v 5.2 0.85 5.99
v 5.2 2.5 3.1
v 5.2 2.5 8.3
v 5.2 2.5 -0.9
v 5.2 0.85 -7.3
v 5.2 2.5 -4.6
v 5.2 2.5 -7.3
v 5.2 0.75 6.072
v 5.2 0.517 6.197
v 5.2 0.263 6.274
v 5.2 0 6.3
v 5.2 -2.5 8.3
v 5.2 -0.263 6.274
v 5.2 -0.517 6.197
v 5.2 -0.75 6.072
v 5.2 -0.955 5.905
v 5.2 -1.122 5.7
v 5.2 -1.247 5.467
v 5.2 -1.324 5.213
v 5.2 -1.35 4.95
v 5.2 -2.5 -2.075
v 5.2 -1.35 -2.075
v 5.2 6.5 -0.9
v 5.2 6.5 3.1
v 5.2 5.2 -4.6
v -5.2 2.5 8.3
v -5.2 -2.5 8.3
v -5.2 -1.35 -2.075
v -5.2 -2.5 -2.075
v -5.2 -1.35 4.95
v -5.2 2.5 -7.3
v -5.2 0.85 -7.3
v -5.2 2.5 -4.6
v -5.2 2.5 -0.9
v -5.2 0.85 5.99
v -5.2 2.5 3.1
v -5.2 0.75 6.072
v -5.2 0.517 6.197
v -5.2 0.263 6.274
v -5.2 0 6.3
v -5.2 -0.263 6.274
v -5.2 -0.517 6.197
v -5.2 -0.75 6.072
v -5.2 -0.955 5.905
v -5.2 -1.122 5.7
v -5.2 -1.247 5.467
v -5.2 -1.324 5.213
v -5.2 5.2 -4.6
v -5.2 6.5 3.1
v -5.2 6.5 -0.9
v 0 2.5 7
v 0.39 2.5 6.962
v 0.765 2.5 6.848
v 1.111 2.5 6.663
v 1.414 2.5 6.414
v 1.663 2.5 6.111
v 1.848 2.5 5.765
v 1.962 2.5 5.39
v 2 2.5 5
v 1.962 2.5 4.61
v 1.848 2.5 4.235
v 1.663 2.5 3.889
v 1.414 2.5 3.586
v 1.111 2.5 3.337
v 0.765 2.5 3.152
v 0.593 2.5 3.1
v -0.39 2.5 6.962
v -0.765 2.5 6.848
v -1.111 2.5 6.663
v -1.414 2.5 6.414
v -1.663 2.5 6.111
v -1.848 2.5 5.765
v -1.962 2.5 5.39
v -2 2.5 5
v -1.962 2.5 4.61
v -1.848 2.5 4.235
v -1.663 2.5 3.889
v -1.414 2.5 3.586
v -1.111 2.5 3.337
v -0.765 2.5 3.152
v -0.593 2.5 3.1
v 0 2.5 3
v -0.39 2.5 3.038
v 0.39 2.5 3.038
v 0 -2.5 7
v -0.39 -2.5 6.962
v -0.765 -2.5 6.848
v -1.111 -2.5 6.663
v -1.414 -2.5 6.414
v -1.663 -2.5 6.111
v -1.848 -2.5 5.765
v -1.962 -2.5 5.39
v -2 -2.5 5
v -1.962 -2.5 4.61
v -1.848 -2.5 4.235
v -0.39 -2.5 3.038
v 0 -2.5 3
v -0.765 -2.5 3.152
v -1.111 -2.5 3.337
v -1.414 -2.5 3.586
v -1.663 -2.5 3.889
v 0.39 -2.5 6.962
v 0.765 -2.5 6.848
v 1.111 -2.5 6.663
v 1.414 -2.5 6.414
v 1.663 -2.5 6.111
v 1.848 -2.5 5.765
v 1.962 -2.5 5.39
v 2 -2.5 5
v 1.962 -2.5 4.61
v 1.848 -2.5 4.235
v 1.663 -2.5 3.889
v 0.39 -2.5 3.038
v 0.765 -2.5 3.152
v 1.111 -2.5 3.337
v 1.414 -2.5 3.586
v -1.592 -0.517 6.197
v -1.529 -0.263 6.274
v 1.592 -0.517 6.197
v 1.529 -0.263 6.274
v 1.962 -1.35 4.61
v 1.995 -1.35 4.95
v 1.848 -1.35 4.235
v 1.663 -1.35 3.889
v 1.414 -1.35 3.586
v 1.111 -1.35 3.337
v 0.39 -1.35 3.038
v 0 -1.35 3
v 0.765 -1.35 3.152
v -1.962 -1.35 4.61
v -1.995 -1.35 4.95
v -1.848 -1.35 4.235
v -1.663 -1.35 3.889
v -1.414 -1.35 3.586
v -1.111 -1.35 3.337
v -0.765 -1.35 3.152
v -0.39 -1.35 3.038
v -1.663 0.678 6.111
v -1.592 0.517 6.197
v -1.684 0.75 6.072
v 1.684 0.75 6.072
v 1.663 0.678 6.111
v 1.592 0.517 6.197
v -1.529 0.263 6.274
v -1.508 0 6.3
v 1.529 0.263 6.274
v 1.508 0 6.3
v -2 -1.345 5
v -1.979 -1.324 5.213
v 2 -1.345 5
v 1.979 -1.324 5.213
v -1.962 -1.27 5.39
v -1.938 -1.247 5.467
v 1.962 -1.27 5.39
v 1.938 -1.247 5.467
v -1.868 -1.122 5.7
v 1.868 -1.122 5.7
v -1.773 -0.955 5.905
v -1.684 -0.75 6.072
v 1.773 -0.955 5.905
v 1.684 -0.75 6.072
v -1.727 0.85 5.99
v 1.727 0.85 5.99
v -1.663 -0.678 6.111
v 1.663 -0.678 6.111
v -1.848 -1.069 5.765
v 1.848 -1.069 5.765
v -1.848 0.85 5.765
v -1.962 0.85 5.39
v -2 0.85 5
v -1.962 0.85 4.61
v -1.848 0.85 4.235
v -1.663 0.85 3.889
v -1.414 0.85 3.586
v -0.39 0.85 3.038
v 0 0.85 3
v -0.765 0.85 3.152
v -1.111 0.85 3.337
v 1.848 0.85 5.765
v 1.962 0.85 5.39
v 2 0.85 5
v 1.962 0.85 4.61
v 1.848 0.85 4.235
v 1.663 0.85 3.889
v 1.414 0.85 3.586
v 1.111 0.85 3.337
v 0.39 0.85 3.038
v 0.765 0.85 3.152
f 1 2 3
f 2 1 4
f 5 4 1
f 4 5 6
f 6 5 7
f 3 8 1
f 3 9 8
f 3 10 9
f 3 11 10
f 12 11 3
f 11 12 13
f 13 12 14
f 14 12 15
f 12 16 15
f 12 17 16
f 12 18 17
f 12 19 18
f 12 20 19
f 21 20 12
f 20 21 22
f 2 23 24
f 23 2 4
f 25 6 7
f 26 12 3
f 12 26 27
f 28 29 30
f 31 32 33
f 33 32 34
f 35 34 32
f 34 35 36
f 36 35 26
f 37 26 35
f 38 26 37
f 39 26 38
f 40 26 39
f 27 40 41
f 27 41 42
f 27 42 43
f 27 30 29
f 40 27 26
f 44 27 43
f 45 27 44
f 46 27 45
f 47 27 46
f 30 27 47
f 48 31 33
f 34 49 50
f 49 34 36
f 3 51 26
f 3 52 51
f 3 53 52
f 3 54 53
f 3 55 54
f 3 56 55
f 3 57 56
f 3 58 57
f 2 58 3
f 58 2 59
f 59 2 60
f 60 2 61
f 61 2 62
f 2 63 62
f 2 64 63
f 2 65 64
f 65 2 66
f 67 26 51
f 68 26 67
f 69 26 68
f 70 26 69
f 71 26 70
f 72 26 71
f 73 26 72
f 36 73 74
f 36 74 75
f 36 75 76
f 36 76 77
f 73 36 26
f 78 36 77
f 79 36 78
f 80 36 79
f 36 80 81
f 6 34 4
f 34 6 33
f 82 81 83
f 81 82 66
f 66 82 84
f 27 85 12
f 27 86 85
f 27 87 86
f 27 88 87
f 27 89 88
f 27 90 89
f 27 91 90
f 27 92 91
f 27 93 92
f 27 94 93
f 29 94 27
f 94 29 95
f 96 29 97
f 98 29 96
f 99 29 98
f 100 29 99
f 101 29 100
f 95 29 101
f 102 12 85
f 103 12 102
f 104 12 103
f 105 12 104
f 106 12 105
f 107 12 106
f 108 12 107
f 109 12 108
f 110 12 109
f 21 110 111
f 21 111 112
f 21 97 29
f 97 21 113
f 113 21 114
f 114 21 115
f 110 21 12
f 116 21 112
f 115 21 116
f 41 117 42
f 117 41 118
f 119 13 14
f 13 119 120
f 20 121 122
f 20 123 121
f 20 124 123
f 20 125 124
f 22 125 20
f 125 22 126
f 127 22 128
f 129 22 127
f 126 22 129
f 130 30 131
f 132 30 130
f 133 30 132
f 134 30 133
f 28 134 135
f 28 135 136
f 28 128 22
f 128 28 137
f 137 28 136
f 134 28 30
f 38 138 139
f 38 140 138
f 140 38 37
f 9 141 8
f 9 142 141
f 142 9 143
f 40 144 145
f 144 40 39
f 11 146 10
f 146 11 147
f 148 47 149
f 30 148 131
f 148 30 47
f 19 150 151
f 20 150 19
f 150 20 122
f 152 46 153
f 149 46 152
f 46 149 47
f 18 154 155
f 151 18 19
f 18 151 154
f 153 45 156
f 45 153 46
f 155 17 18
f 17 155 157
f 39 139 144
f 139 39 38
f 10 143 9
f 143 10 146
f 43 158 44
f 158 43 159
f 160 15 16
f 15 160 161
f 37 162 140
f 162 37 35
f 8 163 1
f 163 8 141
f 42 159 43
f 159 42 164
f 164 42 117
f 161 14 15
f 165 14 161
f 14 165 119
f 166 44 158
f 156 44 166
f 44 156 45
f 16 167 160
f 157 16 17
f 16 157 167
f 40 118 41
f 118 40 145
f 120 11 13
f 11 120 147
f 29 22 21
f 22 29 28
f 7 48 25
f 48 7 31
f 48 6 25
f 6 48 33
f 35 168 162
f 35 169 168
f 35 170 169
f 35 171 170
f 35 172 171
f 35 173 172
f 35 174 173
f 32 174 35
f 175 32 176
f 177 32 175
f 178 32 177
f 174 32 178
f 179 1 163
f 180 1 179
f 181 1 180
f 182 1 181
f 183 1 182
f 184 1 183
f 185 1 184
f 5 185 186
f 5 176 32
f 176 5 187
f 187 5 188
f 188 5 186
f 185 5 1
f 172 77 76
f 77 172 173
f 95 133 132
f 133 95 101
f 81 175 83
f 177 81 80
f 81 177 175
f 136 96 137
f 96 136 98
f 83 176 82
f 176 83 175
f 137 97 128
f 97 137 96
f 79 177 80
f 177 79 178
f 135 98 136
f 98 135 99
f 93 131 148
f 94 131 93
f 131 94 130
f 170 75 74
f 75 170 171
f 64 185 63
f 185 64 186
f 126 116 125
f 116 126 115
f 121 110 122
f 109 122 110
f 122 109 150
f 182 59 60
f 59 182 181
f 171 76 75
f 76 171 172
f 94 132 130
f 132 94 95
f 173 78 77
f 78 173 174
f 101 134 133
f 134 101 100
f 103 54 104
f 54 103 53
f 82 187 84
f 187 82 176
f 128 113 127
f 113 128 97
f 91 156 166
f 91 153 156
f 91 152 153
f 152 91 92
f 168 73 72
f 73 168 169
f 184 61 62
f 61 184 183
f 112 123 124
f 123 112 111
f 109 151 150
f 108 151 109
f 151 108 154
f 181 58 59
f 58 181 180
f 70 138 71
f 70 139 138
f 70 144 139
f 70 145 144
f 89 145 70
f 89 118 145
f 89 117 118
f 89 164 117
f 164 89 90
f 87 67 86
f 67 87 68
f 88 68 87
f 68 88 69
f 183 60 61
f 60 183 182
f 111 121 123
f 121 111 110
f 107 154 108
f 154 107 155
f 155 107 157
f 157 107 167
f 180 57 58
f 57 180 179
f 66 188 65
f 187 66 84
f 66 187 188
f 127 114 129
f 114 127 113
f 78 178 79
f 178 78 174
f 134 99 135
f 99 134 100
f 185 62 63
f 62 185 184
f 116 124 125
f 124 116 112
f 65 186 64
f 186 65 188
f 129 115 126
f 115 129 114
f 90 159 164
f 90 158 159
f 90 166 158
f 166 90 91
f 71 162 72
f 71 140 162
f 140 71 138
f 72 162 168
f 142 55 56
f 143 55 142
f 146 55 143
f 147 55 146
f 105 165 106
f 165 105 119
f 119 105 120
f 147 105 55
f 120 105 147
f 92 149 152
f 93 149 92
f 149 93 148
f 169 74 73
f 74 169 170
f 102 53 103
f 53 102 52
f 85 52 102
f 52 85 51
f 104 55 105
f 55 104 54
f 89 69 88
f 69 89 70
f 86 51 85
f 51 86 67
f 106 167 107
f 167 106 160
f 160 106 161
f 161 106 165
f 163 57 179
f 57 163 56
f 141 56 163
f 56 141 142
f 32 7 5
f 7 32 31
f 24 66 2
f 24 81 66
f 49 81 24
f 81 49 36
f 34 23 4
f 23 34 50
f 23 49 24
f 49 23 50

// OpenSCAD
top_hole_width = 11;
top_hole_length = 5;
pocket_bottom_diameter = 5;
bar_top_to_pocket_bottom = 8.3;
wall_size = 1;
back_hole_height = 4;
back_bar_length = 4;
back_bar_height = 4;
gap = 0.3;
center_cutout_depth = top_hole_length - wall_size * 2 - gap;

module center_cutout(){
    translate([0, 0, wall_size * -2]) 
    rotate([0,90,0])
    hull(){
        translate([bar_top_to_pocket_bottom - center_cutout_depth/2,0,0])
        cylinder(d = center_cutout_depth, h = top_hole_width + 1, $fn=32, center = true);
        translate([-bar_top_to_pocket_bottom + center_cutout_depth/2,0,0])
        cylinder(d = center_cutout_depth, h = top_hole_width + 1, $fn=32, center = true);
    }
}
module locking_tab(){
    rotate([0, 90, 0])
    linear_extrude(height = top_hole_width - gap * 2, center = true)
    polygon(points = [[0, 0], [center_cutout_depth, 0], [0, center_cutout_depth]]);
}
difference(){

    union(){
        difference(){
            cube([top_hole_width - gap*2, top_hole_length, bar_top_to_pocket_bottom * 2], center = true);
            center_cutout();

            //rear wall short cutout
            translate([0,-top_hole_length/2 + wall_size/2,-bar_top_to_pocket_bottom * 1.25])
            cube([top_hole_width - gap*2, wall_size * 2, bar_top_to_pocket_bottom * 2], center = true);
        }

        translate([0,top_hole_length/2,-bar_top_to_pocket_bottom + back_hole_height - gap])
        locking_tab();

        //thicker front to support locking tab strentgh
        translate([0,center_cutout_depth/2,0])
        cube([top_hole_width - gap*2, wall_size, bar_top_to_pocket_bottom * 2], center = true);
    }

    //mounting hole
    translate([0,0,5])
    rotate([0,90,90])
    cylinder(d = 4, h = top_hole_length * 4, center = true, $fn = 32);

    //front bar under-latch cutout
    translate([0,top_hole_length/2 - wall_size,-bar_top_to_pocket_bottom * 2 + 1 ])
    cube([top_hole_width - gap*2, wall_size * 2, bar_top_to_pocket_bottom * 2], center = true);
}
//locking block to prevent twist out
translate([0,back_bar_length/2 +  top_hole_length/2,-bar_top_to_pocket_bottom + back_hole_height - gap*2 + back_bar_height/2 + back_bar_height])
cube([top_hole_width - gap * 2, back_bar_length, back_bar_length], center = true);
